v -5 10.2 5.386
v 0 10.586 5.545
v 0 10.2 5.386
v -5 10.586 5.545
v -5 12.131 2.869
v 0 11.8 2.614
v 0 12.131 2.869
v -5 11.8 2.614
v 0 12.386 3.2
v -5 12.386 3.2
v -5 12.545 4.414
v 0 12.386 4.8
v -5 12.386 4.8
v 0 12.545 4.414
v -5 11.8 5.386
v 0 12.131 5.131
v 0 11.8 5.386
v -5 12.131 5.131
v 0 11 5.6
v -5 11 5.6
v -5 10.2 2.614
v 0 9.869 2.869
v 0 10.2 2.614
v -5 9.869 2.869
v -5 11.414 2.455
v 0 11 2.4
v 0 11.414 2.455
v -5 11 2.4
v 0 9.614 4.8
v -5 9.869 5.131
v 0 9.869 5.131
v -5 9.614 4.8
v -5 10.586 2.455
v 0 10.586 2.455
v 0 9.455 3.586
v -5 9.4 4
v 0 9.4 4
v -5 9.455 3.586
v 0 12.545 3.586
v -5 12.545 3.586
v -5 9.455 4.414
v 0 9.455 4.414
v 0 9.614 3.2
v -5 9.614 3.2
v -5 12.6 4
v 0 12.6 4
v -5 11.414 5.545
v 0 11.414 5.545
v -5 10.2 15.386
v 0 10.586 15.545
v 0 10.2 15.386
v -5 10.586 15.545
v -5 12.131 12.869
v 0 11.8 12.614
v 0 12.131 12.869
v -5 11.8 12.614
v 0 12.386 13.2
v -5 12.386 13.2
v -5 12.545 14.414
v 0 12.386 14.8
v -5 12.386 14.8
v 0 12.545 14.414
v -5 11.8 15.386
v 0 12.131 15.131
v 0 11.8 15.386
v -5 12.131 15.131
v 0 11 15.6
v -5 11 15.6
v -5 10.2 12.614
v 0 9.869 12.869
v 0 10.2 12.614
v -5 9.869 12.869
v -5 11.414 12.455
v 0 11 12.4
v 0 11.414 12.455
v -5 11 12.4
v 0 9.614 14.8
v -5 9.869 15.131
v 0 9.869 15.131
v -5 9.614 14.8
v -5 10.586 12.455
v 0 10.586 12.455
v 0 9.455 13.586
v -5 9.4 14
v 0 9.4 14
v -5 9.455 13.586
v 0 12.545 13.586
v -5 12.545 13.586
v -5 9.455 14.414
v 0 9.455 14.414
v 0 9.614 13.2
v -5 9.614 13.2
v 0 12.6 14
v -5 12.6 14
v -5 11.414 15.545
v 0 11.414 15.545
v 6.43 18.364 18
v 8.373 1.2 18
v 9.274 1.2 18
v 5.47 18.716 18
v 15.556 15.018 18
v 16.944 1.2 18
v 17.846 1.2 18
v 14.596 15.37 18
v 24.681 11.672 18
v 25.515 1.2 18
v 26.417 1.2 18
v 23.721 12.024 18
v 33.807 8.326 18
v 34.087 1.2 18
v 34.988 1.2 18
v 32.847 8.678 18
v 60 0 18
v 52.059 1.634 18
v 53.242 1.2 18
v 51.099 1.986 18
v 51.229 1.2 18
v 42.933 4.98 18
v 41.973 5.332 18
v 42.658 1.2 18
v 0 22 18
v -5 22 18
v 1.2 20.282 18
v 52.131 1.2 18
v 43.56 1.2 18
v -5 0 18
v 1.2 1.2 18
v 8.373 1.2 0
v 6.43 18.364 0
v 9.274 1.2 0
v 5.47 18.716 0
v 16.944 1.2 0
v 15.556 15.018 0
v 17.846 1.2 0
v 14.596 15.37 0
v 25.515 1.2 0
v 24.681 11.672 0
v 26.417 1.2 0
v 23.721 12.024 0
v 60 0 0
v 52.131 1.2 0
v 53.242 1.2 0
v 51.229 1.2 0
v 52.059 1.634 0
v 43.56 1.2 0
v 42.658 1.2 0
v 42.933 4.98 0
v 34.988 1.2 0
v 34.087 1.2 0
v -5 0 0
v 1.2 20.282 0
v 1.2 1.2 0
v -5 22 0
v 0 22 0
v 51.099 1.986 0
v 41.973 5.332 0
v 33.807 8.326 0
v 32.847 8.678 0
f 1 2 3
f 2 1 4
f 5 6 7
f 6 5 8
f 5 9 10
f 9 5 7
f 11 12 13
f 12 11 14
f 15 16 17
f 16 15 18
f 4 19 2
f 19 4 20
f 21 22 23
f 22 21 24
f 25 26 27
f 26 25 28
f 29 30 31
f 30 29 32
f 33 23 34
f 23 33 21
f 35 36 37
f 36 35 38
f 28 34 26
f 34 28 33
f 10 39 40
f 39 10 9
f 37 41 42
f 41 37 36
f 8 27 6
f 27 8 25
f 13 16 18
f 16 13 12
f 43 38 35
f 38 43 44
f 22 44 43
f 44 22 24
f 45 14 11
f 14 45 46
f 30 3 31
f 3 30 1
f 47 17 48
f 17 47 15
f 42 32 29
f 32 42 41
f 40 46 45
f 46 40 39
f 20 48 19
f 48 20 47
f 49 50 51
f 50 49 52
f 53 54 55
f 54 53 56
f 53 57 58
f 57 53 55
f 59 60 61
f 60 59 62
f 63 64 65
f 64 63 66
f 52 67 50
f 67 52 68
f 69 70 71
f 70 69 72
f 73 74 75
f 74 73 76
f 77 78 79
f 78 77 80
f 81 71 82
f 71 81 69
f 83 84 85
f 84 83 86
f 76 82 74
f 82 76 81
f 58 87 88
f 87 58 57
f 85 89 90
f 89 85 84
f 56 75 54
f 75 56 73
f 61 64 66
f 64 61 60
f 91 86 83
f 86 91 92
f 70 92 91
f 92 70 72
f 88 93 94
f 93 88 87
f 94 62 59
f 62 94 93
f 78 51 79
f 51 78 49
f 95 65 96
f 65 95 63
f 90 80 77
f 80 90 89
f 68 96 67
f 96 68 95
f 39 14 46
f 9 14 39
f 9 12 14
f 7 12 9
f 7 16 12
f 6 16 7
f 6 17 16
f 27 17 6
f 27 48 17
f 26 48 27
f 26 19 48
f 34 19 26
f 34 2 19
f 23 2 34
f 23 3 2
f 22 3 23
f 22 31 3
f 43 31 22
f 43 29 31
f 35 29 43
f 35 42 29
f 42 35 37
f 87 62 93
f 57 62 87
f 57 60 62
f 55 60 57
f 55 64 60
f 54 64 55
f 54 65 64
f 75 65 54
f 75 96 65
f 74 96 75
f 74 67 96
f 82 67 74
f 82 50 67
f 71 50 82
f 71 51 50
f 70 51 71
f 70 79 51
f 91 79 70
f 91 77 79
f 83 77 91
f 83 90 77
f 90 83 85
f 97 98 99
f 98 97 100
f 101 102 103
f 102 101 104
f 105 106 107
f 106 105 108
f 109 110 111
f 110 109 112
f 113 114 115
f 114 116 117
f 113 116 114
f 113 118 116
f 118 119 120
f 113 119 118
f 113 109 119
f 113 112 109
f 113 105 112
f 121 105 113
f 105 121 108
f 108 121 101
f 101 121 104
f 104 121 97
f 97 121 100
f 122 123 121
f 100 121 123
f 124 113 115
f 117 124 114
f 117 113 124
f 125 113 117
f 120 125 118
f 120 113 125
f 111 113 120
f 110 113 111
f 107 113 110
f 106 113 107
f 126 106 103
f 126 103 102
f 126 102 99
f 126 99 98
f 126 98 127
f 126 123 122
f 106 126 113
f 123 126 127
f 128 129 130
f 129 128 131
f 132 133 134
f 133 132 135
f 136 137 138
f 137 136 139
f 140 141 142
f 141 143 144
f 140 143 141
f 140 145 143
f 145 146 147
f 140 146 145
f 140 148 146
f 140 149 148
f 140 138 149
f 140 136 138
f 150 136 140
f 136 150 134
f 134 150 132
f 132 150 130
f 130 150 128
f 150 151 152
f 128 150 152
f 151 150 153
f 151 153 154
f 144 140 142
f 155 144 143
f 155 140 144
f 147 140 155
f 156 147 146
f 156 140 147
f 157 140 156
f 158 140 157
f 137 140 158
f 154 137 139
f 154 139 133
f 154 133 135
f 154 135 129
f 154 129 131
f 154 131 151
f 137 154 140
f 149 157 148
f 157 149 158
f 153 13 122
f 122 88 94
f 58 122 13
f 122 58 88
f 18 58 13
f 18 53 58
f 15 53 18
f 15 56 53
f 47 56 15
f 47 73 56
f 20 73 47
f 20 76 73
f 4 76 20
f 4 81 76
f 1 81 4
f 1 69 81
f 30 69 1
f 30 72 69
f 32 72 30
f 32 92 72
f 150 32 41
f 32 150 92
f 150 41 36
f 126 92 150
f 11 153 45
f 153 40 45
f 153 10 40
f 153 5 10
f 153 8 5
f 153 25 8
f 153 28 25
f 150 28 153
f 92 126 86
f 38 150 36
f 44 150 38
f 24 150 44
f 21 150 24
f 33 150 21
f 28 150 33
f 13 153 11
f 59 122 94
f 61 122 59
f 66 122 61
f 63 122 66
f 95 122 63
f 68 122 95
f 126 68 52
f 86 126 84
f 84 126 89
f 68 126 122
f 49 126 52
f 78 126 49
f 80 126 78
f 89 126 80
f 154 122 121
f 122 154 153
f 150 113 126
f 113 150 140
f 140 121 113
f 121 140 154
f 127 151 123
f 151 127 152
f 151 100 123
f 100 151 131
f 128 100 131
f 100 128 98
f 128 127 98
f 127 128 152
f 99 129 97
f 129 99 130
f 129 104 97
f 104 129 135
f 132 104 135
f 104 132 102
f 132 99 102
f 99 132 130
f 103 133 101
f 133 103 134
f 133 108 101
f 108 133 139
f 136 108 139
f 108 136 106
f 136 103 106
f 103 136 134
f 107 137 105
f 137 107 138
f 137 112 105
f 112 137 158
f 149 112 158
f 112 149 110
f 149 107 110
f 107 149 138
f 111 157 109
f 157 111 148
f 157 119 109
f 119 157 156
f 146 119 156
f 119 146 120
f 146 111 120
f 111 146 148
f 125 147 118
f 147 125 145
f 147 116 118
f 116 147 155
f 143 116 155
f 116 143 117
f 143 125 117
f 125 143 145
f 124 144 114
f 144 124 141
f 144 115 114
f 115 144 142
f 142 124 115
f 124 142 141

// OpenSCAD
// finray_finger.scad: a parametric fin-ray style finger to print in TPU.
// Two thin flanks meet at the tip; thin ribs join them. Press the front flank and the
// ribs make the finger curl AROUND the object instead of pushing it away.
//   Render:  openscad -o finray_finger.stl finray_finger.scad
// The mounting base is generic: measure the jaw you bolt it to and change mount_*.

length     = 60;     // base to tip, mm
base_w     = 22;     // finger depth at the base (front flank to back flank), mm
height     = 18;     // extrusion = finger width across the object, mm
flank      = 1.2;    // flank thickness: thinner = softer
ribs       = 6;      // number of internal ribs
rib_t      = 0.9;    // rib thickness
rib_tilt   = 10;     // deg: > 0 leans the ribs toward the base; try +10 and -10

base_t     = 5;      // solid mounting block, mm
mount_d    = 3.2;    // M3 holes
mount_pitch= 10;     // distance between the two holes: MEASURE YOUR JAW

echo("finger (mm)", length + base_t, "x", base_w, "x", height);
assert(flank >= 0.8, "flanks thinner than two 0.4 mm lines will not print cleanly");
assert(mount_pitch + mount_d < height, "mount holes do not fit across the finger width");

// front flank runs from (0,0) to the tip (length, 0); back flank from (0, base_w) to the tip
function back_y(x) = base_w * (1 - x / length);

module outline() {
  polygon([[0, 0], [length, 0], [0, base_w]]);
}

module hollow() {                        // the triangle minus its insides = two flanks
  difference() {
    outline();
    offset(delta = -flank) outline();
  }
}

module rib(i) {                          // a rib from the front flank to the back flank
  x = length * i / (ribs + 1);
  dx = back_y(x) * tan(rib_tilt);        // lean toward the base
  hull() {
    translate([x, 0]) square([rib_t, 0.01]);
    translate([max(0, x - dx), back_y(max(0, x - dx)) - 0.01]) square([rib_t, 0.01]);
  }
}

linear_extrude(height) {
  hollow();
  intersection() {
    outline();
    union() for (i = [1 : ribs]) rib(i);
  }
}
difference() {                           // mounting block behind the base of the finger
  translate([-base_t, 0, 0]) cube([base_t, base_w, height]);
  for (s = [-1, 1])
    translate([-base_t - 1, base_w / 2, height / 2 + s * mount_pitch / 2])
      rotate([0, 90, 0]) cylinder(d = mount_d, h = base_t + 2, $fn = 24);
}
